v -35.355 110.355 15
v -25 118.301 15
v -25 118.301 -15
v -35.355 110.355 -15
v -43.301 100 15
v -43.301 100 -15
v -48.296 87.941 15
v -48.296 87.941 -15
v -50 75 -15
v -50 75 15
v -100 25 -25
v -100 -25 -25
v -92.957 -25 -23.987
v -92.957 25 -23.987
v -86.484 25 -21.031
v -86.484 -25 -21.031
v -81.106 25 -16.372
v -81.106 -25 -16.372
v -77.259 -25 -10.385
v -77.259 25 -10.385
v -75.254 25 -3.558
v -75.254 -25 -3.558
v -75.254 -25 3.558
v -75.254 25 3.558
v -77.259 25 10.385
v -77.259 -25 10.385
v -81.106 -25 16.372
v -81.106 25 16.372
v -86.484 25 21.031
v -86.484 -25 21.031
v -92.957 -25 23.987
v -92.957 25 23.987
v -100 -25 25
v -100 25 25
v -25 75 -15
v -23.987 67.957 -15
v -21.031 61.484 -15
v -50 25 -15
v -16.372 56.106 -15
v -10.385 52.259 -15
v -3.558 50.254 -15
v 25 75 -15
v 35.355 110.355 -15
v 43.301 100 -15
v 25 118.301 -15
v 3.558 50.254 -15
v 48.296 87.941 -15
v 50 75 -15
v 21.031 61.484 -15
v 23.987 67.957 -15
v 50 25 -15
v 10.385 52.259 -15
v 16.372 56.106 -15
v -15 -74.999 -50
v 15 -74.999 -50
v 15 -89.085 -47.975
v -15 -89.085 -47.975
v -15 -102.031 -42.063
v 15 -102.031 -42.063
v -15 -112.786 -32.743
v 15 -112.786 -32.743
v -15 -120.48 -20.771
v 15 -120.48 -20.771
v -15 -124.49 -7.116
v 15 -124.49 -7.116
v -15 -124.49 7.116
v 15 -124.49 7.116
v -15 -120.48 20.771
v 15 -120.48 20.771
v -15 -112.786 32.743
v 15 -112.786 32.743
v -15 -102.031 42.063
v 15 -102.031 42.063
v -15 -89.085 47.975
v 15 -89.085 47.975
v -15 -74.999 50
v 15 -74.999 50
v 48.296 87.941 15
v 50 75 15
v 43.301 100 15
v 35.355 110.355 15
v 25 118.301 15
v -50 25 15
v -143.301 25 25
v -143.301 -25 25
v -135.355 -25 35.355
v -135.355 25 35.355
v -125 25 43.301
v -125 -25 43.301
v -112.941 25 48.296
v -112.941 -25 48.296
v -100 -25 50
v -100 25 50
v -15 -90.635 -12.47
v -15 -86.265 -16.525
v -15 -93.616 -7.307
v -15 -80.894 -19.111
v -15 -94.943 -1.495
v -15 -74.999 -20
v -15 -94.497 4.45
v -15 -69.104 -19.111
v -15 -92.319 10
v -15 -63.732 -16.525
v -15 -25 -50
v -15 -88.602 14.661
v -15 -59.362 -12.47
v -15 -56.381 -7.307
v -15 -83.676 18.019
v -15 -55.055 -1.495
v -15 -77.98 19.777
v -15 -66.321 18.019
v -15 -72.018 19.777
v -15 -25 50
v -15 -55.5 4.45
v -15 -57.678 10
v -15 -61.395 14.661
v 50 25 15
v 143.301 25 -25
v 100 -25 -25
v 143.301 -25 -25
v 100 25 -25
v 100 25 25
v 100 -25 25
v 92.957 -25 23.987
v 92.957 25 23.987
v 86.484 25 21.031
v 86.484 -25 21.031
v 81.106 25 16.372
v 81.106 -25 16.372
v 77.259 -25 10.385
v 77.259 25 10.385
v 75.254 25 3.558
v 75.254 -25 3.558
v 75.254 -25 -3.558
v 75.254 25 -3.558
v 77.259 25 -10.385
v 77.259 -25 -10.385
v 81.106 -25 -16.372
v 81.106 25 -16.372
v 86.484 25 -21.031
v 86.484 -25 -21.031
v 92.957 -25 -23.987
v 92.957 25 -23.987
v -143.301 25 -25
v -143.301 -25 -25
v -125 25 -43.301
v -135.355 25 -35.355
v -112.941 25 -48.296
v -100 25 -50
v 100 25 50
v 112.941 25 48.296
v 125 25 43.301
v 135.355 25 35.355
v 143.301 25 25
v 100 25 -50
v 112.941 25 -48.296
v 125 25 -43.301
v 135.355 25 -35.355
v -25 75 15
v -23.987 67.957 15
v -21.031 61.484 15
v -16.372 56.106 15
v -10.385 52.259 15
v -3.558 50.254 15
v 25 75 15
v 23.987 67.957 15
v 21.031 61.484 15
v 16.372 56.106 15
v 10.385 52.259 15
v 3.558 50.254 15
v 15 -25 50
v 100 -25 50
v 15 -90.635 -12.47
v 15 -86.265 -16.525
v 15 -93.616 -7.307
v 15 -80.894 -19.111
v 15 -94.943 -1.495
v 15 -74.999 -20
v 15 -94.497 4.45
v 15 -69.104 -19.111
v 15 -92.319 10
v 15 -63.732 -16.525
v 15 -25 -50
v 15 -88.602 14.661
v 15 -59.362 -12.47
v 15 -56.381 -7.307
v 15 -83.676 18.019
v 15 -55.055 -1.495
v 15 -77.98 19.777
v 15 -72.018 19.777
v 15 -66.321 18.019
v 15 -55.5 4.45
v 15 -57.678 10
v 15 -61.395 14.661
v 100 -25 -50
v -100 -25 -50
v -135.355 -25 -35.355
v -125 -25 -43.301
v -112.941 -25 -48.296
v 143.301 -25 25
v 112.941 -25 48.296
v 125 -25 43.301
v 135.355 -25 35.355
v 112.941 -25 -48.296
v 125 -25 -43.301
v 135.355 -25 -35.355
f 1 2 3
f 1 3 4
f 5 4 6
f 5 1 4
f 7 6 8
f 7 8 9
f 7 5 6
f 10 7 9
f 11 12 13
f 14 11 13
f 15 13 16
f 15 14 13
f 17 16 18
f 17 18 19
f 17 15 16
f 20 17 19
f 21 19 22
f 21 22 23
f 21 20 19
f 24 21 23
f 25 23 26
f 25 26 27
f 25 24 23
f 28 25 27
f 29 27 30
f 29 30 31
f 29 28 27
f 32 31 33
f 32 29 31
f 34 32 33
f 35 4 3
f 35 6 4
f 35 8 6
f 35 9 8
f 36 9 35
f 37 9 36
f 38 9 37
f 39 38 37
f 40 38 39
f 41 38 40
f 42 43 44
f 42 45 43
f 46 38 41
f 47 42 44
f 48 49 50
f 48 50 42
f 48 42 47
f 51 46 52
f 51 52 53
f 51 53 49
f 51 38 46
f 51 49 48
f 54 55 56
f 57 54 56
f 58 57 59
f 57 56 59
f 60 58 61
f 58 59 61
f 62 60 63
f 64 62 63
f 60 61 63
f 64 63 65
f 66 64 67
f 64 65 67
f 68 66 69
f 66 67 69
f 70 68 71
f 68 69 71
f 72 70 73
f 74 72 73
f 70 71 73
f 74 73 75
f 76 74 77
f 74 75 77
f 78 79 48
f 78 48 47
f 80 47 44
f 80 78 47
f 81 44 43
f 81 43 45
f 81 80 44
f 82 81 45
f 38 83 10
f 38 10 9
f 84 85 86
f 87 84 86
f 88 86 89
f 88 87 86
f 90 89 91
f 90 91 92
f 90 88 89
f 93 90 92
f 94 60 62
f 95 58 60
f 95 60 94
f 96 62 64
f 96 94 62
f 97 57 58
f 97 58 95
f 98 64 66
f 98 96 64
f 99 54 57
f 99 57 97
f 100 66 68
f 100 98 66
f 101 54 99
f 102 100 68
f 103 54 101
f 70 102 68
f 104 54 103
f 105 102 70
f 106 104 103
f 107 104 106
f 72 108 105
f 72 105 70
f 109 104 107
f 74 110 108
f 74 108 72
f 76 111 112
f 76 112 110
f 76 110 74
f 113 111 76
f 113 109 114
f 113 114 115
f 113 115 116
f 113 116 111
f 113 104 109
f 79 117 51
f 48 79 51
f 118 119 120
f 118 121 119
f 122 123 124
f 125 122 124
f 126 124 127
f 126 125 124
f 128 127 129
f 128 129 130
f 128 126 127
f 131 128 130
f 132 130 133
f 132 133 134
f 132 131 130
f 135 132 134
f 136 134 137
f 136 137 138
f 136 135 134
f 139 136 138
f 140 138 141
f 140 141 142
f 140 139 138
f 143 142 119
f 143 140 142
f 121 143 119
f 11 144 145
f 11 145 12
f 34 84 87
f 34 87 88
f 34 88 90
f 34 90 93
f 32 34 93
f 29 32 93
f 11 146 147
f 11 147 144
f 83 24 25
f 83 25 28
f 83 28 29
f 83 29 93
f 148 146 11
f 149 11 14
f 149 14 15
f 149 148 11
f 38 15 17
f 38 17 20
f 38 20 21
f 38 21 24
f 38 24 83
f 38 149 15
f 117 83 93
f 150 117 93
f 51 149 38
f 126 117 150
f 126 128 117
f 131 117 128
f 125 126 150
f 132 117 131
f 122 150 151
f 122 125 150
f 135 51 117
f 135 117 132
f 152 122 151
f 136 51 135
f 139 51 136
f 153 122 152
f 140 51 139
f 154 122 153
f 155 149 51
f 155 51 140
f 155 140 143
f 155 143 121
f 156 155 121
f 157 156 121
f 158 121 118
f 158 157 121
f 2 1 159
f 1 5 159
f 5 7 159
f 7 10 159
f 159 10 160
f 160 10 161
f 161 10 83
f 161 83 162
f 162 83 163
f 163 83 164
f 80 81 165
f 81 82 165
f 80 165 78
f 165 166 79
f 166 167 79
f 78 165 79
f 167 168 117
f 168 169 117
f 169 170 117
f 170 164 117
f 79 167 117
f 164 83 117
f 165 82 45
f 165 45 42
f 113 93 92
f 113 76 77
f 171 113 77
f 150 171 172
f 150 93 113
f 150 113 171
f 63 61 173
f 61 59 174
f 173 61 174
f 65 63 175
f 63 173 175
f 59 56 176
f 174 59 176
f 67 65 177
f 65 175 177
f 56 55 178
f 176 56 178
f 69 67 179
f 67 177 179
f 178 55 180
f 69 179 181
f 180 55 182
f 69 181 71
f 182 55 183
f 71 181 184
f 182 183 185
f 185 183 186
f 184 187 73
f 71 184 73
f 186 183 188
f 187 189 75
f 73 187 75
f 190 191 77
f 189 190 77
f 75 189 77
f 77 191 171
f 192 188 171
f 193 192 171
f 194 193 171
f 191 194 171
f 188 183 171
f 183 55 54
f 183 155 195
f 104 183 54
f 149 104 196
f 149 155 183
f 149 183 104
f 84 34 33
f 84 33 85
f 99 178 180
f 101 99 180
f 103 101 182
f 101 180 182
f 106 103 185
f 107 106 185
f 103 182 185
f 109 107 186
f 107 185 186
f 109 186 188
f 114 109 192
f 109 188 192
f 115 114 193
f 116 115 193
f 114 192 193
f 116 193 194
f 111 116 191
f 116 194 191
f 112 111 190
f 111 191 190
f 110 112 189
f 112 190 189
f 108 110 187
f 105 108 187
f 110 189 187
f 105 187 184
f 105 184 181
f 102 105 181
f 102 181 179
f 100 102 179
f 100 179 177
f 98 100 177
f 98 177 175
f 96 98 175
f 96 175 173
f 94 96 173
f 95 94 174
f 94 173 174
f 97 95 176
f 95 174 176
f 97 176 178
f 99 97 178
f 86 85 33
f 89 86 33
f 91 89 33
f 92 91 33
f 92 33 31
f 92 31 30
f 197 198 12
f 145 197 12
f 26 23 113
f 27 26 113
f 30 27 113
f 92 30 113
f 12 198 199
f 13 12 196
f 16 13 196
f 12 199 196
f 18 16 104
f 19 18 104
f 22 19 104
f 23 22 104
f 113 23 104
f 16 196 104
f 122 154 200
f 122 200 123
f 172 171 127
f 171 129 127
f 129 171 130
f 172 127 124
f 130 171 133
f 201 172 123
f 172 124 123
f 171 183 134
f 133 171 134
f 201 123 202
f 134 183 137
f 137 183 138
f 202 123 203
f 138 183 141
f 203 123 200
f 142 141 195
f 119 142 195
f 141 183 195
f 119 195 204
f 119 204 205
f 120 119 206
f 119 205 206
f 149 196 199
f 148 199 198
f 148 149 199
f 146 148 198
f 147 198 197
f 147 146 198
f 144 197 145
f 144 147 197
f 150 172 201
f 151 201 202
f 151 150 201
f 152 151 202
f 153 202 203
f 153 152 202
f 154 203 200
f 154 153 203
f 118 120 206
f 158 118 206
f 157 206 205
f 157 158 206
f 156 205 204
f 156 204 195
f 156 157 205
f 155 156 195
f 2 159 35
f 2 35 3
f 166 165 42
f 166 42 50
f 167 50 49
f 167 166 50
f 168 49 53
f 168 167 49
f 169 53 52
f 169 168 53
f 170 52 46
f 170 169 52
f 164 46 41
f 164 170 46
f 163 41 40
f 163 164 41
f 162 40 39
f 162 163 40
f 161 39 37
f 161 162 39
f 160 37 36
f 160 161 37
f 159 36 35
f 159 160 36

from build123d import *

# Parameters (mm, degrees)
BOSS_EXTRUDE1_DEPTH = 25
SKETCH2_W           = 100
SKETCH2_H           = 30
BOSS_EXTRUDE3_DEPTH = 150
CUT_EXTRUDE1_DEPTH  = 150
BOSS_EXTRUDE4_DEPTH = 15
SKETCH7_R           = 20
CUT_EXTRUDE2_DEPTH  = 30


with BuildPart() as part:
    # Sketch1 → Boss-Extrude1 (new body, symmetric)
    with BuildSketch(Plane(origin=(0, 0, 0), x_dir=(1, 0, 0), z_dir=(0, 1, 0))):
        with BuildLine():
            Line((100, 50), (-100, 50))
            ThreePointArc((-100, 50), (-125, 43.301270189), (-143.301270189, 25))
            Line((-143.301270189, 25), (-100, 25))
            ThreePointArc((-100, 25), (-75, 0), (-100, -25))
            Line((-100, -25), (-143.301270189, -25))
            ThreePointArc((-143.301270189, -25), (-125, -43.301270189), (-100, -50))
            Line((-100, -50), (100, -50))
            ThreePointArc((100, -50), (125, -43.301270189), (143.301270189, -25))
            Line((143.301270189, -25), (100, -25))
            ThreePointArc((100, -25), (75, 0), (100, 25))
            Line((100, 25), (143.301270189, 25))
            ThreePointArc((143.301270189, 25), (125, 43.301270189), (100, 50))
        make_face()
    extrude(amount=BOSS_EXTRUDE1_DEPTH, both=True)

    # Sketch2 → Boss-Extrude3 (add)
    with BuildSketch(Plane(origin=(0, 25, 0), x_dir=(1, 0, 0), z_dir=(0, 1, 0))):
        Rectangle(SKETCH2_W, SKETCH2_H)
    extrude(amount=BOSS_EXTRUDE3_DEPTH)

    # Sketch4 → Cut-Extrude1 (cut)
    with BuildSketch(Plane.XY.offset(15)):
        with BuildLine():
            Line((-25, 75), (-25, 118.301270189))
            ThreePointArc((-25, 118.301270189), (-43.301270189, 100), (-50, 75))
            Line((-50, 75), (-50, 175))
            Line((-50, 175), (50, 175))
            Line((50, 175), (50, 75))
            ThreePointArc((50, 75), (43.301270189, 100), (25, 118.301270189))
            Line((25, 118.301270189), (25, 75))
            ThreePointArc((25, 75), (0, 50), (-25, 75))
        make_face()
    extrude(amount=-CUT_EXTRUDE1_DEPTH, mode=Mode.SUBTRACT)

    # Sketch6 → Boss-Extrude4 (add, symmetric)
    with BuildSketch(Plane(origin=(0, 0, 0), x_dir=(0, 0, -1), z_dir=(1, 0, 0))):
        with BuildLine():
            Line((-50, -74.998729811), (-50, -25))
            Line((-50, -25), (-25, -25))
            Line((-25, -25), (25, -25))
            Line((25, -25), (50, -25))
            Line((50, -25), (50, -74.998729811))
            ThreePointArc((50, -74.998729811), (0, -124.998729811), (-50, -74.998729811))
        make_face()
    extrude(amount=BOSS_EXTRUDE4_DEPTH, both=True)

    # Sketch7 → Cut-Extrude2 (cut)
    with BuildSketch(Plane(origin=(15, 0, 0), x_dir=(0, 0, -1), z_dir=(1, 0, 0))):
        with Locations((0, -74.998729811)):
            Circle(SKETCH7_R)
    extrude(amount=-CUT_EXTRUDE2_DEPTH, mode=Mode.SUBTRACT)


solid = part.part
